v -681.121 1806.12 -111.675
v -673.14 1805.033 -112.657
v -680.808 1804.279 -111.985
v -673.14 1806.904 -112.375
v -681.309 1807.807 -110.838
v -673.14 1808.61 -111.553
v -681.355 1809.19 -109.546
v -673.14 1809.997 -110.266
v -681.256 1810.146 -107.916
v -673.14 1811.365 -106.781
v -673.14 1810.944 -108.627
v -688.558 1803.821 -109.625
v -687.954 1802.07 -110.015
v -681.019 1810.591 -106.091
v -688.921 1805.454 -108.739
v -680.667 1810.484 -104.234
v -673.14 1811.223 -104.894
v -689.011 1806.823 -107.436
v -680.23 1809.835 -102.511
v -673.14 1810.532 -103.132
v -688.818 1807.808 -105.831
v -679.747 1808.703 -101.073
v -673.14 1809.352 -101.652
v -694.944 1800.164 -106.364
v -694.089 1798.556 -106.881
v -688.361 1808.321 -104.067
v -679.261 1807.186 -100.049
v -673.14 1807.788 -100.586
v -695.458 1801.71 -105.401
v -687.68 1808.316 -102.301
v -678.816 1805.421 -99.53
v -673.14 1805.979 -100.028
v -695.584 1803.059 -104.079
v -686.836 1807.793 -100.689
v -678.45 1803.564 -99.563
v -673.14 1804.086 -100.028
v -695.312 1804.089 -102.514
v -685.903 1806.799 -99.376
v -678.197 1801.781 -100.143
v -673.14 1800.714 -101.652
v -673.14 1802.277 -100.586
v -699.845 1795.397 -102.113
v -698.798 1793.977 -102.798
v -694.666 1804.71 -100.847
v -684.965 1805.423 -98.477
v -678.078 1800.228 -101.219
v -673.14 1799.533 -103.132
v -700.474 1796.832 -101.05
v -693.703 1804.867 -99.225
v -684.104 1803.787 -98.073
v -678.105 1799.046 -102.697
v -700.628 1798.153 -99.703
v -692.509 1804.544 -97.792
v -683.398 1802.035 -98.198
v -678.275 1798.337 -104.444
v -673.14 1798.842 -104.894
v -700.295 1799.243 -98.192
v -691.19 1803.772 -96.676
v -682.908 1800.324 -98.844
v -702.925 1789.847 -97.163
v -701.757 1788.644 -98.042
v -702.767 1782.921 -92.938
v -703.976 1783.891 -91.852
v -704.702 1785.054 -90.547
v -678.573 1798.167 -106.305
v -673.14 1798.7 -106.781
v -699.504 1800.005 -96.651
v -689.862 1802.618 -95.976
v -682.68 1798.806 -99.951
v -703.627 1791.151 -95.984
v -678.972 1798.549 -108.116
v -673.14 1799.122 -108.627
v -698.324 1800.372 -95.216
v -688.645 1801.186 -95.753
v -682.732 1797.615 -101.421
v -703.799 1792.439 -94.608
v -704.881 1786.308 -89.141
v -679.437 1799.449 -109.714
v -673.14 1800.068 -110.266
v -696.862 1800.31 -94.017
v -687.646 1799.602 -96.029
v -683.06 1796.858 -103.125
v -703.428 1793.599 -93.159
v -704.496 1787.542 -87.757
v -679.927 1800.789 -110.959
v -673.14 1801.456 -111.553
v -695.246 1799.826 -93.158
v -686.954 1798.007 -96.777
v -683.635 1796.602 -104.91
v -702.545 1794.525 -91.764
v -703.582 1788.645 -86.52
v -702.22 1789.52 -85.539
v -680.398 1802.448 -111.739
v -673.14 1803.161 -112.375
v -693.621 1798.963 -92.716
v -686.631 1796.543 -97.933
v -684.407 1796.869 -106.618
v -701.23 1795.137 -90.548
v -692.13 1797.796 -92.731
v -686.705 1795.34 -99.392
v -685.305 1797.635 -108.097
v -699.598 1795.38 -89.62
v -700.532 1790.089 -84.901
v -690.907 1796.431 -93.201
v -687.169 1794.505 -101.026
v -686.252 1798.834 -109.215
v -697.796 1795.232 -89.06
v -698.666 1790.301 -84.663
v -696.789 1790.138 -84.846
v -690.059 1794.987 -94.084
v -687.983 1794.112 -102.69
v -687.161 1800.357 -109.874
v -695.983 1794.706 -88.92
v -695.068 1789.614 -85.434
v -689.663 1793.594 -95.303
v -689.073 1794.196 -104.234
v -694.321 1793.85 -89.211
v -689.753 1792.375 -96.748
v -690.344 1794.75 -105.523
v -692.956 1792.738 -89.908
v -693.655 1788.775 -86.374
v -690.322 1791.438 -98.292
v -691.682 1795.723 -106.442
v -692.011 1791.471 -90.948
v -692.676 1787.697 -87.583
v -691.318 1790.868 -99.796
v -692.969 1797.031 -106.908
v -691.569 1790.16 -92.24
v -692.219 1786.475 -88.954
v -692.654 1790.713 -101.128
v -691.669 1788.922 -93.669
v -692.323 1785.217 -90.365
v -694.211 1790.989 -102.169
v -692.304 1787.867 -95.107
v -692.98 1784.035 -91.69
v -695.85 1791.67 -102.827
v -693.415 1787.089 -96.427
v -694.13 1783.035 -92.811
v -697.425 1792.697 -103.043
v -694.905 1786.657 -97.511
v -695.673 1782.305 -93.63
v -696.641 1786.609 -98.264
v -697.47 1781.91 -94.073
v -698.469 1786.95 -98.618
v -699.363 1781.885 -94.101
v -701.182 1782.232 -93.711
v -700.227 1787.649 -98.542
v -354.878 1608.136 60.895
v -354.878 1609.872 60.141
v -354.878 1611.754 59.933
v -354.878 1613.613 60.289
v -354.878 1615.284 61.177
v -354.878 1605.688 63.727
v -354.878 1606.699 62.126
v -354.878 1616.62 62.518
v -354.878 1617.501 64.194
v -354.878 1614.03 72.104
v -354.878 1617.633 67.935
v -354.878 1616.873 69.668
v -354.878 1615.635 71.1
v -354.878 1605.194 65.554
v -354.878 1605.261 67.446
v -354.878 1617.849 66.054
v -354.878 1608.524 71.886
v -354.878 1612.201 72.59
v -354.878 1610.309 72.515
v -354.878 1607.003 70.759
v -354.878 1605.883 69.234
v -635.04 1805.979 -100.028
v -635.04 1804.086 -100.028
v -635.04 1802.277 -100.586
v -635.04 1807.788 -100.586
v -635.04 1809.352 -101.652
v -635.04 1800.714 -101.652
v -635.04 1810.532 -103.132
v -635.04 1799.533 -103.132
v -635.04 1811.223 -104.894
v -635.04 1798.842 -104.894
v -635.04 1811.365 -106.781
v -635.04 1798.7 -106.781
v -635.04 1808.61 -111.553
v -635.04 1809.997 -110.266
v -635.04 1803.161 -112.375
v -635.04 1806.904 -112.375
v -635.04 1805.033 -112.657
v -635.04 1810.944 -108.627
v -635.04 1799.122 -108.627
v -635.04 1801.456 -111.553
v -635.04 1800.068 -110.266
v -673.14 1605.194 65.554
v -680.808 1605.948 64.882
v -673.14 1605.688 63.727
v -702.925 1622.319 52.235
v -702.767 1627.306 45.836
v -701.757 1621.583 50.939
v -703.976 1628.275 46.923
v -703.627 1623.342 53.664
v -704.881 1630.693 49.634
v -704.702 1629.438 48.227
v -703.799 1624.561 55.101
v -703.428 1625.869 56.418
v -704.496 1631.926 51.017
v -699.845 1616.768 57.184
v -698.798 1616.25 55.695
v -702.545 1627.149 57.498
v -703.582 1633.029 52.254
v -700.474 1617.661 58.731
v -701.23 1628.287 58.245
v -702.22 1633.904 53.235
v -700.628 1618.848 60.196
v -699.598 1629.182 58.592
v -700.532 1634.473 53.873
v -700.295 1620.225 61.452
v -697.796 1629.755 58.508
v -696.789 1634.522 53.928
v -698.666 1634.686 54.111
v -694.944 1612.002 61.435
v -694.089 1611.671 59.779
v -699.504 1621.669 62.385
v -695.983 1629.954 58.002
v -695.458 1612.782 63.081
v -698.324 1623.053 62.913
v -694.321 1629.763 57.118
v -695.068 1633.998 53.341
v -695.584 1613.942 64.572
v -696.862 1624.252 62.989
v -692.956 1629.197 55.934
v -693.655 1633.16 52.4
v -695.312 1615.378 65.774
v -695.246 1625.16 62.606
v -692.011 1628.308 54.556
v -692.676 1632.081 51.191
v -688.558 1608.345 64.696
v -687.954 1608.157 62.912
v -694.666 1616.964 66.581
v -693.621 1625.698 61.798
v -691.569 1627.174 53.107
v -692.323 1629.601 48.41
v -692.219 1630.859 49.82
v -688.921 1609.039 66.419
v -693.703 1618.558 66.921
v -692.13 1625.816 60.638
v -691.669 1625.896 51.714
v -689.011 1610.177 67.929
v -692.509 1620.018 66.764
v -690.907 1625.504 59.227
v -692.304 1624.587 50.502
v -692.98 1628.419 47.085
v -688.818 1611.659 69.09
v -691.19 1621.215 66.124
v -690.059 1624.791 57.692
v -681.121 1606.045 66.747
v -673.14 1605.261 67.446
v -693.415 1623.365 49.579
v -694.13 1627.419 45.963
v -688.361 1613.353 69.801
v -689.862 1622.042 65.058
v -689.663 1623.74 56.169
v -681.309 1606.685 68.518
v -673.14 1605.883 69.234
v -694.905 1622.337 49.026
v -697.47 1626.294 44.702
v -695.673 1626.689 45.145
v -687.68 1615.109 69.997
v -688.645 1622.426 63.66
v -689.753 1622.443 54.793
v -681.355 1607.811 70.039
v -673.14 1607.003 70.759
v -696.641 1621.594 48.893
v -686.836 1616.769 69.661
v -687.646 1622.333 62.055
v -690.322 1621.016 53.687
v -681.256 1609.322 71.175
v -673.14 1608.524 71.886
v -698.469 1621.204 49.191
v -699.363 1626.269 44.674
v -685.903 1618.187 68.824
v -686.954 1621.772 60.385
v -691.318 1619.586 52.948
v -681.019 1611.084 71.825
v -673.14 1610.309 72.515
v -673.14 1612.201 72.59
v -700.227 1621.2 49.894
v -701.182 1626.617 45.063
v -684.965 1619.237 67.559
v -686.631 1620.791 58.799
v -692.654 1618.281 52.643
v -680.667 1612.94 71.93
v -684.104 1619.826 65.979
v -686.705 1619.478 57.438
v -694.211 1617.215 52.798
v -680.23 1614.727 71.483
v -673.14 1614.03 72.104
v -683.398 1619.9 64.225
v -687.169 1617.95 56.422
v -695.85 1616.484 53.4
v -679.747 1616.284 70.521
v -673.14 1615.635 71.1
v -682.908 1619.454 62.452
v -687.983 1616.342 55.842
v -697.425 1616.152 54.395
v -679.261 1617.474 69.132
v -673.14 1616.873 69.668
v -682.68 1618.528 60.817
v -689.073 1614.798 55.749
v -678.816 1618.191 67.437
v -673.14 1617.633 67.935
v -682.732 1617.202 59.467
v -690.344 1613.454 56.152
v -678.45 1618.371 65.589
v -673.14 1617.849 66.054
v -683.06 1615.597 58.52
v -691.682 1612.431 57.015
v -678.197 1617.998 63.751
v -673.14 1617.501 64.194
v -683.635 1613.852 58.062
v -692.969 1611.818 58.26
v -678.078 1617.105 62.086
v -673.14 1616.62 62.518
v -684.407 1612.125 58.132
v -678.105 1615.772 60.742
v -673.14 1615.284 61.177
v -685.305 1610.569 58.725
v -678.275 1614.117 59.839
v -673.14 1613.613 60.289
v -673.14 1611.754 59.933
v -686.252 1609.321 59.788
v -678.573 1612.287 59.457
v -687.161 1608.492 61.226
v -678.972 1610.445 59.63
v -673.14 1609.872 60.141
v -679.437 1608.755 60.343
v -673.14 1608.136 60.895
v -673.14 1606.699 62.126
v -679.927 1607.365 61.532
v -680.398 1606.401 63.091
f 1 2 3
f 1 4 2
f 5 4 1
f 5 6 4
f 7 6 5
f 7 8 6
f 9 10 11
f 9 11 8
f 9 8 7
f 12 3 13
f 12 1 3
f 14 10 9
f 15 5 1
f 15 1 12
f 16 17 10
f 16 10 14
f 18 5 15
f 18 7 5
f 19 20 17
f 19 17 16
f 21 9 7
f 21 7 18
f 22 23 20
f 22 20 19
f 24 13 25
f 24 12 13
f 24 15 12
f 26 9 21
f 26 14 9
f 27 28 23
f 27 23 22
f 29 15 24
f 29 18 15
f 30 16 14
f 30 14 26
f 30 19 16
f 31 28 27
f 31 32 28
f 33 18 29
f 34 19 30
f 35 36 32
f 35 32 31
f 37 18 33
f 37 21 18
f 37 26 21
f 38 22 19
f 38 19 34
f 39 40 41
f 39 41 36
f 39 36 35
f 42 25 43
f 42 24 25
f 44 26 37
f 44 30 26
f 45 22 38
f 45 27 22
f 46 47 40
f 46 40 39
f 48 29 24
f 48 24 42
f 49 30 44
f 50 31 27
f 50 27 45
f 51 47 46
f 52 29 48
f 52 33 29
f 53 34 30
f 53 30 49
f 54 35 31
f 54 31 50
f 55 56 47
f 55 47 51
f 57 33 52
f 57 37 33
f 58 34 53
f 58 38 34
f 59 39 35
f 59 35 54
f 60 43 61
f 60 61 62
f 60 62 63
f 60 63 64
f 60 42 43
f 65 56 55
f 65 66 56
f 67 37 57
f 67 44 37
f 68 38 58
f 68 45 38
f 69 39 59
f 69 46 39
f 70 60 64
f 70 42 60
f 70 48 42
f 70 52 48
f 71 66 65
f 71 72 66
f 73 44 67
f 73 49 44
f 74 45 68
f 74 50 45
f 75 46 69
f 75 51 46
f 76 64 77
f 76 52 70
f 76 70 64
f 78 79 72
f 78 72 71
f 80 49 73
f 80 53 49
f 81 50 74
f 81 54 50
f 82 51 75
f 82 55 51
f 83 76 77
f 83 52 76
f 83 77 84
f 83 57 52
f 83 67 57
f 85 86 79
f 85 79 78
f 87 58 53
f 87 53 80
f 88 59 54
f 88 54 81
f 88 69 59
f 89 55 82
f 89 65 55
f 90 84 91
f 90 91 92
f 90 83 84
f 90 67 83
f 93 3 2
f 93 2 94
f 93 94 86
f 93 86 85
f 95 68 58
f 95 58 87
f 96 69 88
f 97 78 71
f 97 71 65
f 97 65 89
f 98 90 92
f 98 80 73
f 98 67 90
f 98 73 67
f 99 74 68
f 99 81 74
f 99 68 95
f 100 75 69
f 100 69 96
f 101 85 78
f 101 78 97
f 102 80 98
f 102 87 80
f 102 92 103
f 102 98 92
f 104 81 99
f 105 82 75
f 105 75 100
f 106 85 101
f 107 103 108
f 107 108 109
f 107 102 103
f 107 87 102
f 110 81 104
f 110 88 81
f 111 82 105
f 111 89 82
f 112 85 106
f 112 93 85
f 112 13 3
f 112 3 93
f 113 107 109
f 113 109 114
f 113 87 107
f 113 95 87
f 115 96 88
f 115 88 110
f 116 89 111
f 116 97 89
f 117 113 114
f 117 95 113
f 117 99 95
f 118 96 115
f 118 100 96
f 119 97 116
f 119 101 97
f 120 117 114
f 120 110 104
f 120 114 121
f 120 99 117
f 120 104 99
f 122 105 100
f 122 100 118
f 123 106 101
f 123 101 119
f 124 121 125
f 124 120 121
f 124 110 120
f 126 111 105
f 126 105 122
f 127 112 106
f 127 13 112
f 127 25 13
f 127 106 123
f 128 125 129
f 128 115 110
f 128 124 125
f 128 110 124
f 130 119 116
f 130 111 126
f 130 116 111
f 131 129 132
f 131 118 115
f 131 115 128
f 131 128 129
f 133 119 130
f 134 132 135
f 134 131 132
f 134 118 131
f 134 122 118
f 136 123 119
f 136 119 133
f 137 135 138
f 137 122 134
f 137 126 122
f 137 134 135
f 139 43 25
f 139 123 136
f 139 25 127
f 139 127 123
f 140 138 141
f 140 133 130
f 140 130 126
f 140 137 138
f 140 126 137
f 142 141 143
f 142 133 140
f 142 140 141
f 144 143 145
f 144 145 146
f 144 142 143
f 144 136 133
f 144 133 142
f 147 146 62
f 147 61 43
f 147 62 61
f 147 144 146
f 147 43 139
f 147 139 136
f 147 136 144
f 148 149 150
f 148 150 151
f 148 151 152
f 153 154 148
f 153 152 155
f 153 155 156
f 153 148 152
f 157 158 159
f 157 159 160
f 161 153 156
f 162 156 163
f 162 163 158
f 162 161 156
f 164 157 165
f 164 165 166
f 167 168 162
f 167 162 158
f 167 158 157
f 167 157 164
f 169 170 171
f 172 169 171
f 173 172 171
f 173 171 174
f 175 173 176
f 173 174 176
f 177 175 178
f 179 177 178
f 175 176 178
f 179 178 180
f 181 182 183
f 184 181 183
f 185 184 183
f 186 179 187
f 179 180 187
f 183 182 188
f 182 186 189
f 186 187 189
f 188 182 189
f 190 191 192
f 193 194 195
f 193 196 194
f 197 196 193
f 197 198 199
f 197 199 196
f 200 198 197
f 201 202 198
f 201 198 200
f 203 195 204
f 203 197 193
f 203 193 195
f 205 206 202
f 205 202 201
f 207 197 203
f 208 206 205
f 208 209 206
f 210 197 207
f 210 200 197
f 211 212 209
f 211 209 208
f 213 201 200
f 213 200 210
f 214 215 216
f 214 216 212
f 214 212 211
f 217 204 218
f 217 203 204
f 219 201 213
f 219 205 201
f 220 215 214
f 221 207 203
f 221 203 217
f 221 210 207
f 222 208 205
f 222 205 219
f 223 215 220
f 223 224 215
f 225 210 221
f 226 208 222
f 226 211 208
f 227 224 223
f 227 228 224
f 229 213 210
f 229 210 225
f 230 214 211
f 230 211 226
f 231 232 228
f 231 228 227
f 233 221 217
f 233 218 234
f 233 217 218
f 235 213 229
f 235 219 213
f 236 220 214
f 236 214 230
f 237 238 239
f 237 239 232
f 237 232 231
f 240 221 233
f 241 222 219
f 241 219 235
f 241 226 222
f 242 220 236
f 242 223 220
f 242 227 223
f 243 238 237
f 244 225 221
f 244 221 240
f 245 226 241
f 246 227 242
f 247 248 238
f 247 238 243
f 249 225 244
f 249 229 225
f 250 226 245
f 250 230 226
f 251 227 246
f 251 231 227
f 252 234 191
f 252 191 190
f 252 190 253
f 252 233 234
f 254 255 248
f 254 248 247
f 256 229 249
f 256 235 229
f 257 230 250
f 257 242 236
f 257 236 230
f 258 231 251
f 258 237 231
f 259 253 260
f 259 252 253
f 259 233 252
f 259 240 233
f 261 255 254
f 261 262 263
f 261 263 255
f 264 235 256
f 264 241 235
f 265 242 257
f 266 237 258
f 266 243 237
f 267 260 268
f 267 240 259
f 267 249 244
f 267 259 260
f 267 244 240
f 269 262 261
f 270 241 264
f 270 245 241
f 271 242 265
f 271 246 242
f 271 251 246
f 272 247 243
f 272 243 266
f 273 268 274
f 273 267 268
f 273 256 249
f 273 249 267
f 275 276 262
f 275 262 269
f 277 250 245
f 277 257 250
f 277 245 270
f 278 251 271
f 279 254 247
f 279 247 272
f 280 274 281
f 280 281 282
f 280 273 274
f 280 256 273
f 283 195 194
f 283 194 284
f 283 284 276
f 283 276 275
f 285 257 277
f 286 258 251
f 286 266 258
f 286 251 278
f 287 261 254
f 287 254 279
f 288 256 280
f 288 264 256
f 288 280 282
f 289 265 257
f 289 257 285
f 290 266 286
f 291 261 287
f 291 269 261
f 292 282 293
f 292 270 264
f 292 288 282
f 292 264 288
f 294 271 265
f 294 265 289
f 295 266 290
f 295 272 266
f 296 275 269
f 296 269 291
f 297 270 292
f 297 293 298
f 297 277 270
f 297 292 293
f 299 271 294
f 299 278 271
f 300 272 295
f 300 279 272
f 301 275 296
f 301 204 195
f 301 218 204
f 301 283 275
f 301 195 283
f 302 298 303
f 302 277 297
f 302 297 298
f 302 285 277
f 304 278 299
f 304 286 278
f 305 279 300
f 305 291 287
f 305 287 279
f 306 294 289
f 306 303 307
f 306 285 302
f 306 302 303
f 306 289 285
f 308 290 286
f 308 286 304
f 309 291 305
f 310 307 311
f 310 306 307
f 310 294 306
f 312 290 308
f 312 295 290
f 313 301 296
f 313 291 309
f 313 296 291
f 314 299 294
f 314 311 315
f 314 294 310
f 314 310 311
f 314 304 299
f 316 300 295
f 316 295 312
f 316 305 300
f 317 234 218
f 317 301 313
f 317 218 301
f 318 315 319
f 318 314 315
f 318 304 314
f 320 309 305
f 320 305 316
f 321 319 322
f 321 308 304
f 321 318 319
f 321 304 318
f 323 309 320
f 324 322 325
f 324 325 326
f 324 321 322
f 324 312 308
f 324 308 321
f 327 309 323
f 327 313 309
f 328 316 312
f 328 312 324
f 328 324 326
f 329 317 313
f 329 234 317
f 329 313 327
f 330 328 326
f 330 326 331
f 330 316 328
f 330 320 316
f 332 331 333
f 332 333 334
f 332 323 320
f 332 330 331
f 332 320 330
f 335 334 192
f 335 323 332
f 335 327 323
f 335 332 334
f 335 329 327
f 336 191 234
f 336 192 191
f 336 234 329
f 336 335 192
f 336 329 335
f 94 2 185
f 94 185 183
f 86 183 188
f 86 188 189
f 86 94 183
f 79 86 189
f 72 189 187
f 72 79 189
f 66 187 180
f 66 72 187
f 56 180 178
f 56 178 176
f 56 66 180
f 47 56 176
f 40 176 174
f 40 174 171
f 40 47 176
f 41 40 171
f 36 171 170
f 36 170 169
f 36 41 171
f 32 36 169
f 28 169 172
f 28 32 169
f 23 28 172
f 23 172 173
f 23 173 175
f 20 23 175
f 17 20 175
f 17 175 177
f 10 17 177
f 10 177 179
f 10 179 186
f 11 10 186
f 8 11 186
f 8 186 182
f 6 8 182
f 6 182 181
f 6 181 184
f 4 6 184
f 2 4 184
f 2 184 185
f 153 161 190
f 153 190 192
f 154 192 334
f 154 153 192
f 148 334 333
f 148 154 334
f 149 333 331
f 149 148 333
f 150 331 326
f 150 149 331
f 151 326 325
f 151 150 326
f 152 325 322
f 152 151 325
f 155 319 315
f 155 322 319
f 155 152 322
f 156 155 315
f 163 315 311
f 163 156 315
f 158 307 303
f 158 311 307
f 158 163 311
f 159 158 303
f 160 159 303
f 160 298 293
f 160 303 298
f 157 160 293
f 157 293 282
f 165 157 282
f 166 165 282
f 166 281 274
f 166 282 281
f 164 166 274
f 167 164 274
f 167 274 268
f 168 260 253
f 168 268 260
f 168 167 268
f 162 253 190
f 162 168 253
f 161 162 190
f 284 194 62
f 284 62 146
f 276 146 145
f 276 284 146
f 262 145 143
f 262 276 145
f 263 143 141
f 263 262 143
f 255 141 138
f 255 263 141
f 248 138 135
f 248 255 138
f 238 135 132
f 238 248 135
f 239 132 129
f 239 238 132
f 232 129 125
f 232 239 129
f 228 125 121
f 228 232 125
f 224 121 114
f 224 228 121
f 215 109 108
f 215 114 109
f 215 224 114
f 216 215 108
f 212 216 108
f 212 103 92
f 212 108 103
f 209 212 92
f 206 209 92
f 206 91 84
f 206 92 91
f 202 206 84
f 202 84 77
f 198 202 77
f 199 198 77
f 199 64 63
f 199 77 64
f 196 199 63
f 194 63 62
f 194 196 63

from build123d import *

# Parameters (mm, degrees)
SWEEP1_PROFILE_R = 6.35


with BuildPart() as part:
    # Sweep1: sweep along a curve in space
    with BuildLine() as sweep1_path:
        Line((-635.040454363, 1805.032599319, -106.306821176), (-673.140454363, 1805.032599319, -106.306821176))
        ThreePointArc((-673.140454363, 1805.032599319, -106.306821176), (-691.100966605, 1799.480226411, -101.355343296), (-698.540454363, 1786.075612435, -89.401418245))
        Line((-698.540454363, 1786.075612435, -89.401418245), (-698.540454363, 1630.459986884, 49.373001358))
        ThreePointArc((-673.140454363, 1611.503, 66.278404289), (-691.100966605, 1617.055372908, 61.326926409), (-698.540454363, 1630.459986884, 49.373001358))
        Line((-354.878454363, 1611.503, 66.278404289), (-673.140454363, 1611.503, 66.278404289))
    # Sweep1 profile (on start of the path) → Sweep1 (sweep)
    with BuildSketch(Plane(origin=(-635.040454363, 1805.032599319, -106.306821176), x_dir=(0, 0, -1), z_dir=(-1, 0, 0))):
        Circle(SWEEP1_PROFILE_R)
    sweep(path=sweep1_path.line)


solid = part.part
